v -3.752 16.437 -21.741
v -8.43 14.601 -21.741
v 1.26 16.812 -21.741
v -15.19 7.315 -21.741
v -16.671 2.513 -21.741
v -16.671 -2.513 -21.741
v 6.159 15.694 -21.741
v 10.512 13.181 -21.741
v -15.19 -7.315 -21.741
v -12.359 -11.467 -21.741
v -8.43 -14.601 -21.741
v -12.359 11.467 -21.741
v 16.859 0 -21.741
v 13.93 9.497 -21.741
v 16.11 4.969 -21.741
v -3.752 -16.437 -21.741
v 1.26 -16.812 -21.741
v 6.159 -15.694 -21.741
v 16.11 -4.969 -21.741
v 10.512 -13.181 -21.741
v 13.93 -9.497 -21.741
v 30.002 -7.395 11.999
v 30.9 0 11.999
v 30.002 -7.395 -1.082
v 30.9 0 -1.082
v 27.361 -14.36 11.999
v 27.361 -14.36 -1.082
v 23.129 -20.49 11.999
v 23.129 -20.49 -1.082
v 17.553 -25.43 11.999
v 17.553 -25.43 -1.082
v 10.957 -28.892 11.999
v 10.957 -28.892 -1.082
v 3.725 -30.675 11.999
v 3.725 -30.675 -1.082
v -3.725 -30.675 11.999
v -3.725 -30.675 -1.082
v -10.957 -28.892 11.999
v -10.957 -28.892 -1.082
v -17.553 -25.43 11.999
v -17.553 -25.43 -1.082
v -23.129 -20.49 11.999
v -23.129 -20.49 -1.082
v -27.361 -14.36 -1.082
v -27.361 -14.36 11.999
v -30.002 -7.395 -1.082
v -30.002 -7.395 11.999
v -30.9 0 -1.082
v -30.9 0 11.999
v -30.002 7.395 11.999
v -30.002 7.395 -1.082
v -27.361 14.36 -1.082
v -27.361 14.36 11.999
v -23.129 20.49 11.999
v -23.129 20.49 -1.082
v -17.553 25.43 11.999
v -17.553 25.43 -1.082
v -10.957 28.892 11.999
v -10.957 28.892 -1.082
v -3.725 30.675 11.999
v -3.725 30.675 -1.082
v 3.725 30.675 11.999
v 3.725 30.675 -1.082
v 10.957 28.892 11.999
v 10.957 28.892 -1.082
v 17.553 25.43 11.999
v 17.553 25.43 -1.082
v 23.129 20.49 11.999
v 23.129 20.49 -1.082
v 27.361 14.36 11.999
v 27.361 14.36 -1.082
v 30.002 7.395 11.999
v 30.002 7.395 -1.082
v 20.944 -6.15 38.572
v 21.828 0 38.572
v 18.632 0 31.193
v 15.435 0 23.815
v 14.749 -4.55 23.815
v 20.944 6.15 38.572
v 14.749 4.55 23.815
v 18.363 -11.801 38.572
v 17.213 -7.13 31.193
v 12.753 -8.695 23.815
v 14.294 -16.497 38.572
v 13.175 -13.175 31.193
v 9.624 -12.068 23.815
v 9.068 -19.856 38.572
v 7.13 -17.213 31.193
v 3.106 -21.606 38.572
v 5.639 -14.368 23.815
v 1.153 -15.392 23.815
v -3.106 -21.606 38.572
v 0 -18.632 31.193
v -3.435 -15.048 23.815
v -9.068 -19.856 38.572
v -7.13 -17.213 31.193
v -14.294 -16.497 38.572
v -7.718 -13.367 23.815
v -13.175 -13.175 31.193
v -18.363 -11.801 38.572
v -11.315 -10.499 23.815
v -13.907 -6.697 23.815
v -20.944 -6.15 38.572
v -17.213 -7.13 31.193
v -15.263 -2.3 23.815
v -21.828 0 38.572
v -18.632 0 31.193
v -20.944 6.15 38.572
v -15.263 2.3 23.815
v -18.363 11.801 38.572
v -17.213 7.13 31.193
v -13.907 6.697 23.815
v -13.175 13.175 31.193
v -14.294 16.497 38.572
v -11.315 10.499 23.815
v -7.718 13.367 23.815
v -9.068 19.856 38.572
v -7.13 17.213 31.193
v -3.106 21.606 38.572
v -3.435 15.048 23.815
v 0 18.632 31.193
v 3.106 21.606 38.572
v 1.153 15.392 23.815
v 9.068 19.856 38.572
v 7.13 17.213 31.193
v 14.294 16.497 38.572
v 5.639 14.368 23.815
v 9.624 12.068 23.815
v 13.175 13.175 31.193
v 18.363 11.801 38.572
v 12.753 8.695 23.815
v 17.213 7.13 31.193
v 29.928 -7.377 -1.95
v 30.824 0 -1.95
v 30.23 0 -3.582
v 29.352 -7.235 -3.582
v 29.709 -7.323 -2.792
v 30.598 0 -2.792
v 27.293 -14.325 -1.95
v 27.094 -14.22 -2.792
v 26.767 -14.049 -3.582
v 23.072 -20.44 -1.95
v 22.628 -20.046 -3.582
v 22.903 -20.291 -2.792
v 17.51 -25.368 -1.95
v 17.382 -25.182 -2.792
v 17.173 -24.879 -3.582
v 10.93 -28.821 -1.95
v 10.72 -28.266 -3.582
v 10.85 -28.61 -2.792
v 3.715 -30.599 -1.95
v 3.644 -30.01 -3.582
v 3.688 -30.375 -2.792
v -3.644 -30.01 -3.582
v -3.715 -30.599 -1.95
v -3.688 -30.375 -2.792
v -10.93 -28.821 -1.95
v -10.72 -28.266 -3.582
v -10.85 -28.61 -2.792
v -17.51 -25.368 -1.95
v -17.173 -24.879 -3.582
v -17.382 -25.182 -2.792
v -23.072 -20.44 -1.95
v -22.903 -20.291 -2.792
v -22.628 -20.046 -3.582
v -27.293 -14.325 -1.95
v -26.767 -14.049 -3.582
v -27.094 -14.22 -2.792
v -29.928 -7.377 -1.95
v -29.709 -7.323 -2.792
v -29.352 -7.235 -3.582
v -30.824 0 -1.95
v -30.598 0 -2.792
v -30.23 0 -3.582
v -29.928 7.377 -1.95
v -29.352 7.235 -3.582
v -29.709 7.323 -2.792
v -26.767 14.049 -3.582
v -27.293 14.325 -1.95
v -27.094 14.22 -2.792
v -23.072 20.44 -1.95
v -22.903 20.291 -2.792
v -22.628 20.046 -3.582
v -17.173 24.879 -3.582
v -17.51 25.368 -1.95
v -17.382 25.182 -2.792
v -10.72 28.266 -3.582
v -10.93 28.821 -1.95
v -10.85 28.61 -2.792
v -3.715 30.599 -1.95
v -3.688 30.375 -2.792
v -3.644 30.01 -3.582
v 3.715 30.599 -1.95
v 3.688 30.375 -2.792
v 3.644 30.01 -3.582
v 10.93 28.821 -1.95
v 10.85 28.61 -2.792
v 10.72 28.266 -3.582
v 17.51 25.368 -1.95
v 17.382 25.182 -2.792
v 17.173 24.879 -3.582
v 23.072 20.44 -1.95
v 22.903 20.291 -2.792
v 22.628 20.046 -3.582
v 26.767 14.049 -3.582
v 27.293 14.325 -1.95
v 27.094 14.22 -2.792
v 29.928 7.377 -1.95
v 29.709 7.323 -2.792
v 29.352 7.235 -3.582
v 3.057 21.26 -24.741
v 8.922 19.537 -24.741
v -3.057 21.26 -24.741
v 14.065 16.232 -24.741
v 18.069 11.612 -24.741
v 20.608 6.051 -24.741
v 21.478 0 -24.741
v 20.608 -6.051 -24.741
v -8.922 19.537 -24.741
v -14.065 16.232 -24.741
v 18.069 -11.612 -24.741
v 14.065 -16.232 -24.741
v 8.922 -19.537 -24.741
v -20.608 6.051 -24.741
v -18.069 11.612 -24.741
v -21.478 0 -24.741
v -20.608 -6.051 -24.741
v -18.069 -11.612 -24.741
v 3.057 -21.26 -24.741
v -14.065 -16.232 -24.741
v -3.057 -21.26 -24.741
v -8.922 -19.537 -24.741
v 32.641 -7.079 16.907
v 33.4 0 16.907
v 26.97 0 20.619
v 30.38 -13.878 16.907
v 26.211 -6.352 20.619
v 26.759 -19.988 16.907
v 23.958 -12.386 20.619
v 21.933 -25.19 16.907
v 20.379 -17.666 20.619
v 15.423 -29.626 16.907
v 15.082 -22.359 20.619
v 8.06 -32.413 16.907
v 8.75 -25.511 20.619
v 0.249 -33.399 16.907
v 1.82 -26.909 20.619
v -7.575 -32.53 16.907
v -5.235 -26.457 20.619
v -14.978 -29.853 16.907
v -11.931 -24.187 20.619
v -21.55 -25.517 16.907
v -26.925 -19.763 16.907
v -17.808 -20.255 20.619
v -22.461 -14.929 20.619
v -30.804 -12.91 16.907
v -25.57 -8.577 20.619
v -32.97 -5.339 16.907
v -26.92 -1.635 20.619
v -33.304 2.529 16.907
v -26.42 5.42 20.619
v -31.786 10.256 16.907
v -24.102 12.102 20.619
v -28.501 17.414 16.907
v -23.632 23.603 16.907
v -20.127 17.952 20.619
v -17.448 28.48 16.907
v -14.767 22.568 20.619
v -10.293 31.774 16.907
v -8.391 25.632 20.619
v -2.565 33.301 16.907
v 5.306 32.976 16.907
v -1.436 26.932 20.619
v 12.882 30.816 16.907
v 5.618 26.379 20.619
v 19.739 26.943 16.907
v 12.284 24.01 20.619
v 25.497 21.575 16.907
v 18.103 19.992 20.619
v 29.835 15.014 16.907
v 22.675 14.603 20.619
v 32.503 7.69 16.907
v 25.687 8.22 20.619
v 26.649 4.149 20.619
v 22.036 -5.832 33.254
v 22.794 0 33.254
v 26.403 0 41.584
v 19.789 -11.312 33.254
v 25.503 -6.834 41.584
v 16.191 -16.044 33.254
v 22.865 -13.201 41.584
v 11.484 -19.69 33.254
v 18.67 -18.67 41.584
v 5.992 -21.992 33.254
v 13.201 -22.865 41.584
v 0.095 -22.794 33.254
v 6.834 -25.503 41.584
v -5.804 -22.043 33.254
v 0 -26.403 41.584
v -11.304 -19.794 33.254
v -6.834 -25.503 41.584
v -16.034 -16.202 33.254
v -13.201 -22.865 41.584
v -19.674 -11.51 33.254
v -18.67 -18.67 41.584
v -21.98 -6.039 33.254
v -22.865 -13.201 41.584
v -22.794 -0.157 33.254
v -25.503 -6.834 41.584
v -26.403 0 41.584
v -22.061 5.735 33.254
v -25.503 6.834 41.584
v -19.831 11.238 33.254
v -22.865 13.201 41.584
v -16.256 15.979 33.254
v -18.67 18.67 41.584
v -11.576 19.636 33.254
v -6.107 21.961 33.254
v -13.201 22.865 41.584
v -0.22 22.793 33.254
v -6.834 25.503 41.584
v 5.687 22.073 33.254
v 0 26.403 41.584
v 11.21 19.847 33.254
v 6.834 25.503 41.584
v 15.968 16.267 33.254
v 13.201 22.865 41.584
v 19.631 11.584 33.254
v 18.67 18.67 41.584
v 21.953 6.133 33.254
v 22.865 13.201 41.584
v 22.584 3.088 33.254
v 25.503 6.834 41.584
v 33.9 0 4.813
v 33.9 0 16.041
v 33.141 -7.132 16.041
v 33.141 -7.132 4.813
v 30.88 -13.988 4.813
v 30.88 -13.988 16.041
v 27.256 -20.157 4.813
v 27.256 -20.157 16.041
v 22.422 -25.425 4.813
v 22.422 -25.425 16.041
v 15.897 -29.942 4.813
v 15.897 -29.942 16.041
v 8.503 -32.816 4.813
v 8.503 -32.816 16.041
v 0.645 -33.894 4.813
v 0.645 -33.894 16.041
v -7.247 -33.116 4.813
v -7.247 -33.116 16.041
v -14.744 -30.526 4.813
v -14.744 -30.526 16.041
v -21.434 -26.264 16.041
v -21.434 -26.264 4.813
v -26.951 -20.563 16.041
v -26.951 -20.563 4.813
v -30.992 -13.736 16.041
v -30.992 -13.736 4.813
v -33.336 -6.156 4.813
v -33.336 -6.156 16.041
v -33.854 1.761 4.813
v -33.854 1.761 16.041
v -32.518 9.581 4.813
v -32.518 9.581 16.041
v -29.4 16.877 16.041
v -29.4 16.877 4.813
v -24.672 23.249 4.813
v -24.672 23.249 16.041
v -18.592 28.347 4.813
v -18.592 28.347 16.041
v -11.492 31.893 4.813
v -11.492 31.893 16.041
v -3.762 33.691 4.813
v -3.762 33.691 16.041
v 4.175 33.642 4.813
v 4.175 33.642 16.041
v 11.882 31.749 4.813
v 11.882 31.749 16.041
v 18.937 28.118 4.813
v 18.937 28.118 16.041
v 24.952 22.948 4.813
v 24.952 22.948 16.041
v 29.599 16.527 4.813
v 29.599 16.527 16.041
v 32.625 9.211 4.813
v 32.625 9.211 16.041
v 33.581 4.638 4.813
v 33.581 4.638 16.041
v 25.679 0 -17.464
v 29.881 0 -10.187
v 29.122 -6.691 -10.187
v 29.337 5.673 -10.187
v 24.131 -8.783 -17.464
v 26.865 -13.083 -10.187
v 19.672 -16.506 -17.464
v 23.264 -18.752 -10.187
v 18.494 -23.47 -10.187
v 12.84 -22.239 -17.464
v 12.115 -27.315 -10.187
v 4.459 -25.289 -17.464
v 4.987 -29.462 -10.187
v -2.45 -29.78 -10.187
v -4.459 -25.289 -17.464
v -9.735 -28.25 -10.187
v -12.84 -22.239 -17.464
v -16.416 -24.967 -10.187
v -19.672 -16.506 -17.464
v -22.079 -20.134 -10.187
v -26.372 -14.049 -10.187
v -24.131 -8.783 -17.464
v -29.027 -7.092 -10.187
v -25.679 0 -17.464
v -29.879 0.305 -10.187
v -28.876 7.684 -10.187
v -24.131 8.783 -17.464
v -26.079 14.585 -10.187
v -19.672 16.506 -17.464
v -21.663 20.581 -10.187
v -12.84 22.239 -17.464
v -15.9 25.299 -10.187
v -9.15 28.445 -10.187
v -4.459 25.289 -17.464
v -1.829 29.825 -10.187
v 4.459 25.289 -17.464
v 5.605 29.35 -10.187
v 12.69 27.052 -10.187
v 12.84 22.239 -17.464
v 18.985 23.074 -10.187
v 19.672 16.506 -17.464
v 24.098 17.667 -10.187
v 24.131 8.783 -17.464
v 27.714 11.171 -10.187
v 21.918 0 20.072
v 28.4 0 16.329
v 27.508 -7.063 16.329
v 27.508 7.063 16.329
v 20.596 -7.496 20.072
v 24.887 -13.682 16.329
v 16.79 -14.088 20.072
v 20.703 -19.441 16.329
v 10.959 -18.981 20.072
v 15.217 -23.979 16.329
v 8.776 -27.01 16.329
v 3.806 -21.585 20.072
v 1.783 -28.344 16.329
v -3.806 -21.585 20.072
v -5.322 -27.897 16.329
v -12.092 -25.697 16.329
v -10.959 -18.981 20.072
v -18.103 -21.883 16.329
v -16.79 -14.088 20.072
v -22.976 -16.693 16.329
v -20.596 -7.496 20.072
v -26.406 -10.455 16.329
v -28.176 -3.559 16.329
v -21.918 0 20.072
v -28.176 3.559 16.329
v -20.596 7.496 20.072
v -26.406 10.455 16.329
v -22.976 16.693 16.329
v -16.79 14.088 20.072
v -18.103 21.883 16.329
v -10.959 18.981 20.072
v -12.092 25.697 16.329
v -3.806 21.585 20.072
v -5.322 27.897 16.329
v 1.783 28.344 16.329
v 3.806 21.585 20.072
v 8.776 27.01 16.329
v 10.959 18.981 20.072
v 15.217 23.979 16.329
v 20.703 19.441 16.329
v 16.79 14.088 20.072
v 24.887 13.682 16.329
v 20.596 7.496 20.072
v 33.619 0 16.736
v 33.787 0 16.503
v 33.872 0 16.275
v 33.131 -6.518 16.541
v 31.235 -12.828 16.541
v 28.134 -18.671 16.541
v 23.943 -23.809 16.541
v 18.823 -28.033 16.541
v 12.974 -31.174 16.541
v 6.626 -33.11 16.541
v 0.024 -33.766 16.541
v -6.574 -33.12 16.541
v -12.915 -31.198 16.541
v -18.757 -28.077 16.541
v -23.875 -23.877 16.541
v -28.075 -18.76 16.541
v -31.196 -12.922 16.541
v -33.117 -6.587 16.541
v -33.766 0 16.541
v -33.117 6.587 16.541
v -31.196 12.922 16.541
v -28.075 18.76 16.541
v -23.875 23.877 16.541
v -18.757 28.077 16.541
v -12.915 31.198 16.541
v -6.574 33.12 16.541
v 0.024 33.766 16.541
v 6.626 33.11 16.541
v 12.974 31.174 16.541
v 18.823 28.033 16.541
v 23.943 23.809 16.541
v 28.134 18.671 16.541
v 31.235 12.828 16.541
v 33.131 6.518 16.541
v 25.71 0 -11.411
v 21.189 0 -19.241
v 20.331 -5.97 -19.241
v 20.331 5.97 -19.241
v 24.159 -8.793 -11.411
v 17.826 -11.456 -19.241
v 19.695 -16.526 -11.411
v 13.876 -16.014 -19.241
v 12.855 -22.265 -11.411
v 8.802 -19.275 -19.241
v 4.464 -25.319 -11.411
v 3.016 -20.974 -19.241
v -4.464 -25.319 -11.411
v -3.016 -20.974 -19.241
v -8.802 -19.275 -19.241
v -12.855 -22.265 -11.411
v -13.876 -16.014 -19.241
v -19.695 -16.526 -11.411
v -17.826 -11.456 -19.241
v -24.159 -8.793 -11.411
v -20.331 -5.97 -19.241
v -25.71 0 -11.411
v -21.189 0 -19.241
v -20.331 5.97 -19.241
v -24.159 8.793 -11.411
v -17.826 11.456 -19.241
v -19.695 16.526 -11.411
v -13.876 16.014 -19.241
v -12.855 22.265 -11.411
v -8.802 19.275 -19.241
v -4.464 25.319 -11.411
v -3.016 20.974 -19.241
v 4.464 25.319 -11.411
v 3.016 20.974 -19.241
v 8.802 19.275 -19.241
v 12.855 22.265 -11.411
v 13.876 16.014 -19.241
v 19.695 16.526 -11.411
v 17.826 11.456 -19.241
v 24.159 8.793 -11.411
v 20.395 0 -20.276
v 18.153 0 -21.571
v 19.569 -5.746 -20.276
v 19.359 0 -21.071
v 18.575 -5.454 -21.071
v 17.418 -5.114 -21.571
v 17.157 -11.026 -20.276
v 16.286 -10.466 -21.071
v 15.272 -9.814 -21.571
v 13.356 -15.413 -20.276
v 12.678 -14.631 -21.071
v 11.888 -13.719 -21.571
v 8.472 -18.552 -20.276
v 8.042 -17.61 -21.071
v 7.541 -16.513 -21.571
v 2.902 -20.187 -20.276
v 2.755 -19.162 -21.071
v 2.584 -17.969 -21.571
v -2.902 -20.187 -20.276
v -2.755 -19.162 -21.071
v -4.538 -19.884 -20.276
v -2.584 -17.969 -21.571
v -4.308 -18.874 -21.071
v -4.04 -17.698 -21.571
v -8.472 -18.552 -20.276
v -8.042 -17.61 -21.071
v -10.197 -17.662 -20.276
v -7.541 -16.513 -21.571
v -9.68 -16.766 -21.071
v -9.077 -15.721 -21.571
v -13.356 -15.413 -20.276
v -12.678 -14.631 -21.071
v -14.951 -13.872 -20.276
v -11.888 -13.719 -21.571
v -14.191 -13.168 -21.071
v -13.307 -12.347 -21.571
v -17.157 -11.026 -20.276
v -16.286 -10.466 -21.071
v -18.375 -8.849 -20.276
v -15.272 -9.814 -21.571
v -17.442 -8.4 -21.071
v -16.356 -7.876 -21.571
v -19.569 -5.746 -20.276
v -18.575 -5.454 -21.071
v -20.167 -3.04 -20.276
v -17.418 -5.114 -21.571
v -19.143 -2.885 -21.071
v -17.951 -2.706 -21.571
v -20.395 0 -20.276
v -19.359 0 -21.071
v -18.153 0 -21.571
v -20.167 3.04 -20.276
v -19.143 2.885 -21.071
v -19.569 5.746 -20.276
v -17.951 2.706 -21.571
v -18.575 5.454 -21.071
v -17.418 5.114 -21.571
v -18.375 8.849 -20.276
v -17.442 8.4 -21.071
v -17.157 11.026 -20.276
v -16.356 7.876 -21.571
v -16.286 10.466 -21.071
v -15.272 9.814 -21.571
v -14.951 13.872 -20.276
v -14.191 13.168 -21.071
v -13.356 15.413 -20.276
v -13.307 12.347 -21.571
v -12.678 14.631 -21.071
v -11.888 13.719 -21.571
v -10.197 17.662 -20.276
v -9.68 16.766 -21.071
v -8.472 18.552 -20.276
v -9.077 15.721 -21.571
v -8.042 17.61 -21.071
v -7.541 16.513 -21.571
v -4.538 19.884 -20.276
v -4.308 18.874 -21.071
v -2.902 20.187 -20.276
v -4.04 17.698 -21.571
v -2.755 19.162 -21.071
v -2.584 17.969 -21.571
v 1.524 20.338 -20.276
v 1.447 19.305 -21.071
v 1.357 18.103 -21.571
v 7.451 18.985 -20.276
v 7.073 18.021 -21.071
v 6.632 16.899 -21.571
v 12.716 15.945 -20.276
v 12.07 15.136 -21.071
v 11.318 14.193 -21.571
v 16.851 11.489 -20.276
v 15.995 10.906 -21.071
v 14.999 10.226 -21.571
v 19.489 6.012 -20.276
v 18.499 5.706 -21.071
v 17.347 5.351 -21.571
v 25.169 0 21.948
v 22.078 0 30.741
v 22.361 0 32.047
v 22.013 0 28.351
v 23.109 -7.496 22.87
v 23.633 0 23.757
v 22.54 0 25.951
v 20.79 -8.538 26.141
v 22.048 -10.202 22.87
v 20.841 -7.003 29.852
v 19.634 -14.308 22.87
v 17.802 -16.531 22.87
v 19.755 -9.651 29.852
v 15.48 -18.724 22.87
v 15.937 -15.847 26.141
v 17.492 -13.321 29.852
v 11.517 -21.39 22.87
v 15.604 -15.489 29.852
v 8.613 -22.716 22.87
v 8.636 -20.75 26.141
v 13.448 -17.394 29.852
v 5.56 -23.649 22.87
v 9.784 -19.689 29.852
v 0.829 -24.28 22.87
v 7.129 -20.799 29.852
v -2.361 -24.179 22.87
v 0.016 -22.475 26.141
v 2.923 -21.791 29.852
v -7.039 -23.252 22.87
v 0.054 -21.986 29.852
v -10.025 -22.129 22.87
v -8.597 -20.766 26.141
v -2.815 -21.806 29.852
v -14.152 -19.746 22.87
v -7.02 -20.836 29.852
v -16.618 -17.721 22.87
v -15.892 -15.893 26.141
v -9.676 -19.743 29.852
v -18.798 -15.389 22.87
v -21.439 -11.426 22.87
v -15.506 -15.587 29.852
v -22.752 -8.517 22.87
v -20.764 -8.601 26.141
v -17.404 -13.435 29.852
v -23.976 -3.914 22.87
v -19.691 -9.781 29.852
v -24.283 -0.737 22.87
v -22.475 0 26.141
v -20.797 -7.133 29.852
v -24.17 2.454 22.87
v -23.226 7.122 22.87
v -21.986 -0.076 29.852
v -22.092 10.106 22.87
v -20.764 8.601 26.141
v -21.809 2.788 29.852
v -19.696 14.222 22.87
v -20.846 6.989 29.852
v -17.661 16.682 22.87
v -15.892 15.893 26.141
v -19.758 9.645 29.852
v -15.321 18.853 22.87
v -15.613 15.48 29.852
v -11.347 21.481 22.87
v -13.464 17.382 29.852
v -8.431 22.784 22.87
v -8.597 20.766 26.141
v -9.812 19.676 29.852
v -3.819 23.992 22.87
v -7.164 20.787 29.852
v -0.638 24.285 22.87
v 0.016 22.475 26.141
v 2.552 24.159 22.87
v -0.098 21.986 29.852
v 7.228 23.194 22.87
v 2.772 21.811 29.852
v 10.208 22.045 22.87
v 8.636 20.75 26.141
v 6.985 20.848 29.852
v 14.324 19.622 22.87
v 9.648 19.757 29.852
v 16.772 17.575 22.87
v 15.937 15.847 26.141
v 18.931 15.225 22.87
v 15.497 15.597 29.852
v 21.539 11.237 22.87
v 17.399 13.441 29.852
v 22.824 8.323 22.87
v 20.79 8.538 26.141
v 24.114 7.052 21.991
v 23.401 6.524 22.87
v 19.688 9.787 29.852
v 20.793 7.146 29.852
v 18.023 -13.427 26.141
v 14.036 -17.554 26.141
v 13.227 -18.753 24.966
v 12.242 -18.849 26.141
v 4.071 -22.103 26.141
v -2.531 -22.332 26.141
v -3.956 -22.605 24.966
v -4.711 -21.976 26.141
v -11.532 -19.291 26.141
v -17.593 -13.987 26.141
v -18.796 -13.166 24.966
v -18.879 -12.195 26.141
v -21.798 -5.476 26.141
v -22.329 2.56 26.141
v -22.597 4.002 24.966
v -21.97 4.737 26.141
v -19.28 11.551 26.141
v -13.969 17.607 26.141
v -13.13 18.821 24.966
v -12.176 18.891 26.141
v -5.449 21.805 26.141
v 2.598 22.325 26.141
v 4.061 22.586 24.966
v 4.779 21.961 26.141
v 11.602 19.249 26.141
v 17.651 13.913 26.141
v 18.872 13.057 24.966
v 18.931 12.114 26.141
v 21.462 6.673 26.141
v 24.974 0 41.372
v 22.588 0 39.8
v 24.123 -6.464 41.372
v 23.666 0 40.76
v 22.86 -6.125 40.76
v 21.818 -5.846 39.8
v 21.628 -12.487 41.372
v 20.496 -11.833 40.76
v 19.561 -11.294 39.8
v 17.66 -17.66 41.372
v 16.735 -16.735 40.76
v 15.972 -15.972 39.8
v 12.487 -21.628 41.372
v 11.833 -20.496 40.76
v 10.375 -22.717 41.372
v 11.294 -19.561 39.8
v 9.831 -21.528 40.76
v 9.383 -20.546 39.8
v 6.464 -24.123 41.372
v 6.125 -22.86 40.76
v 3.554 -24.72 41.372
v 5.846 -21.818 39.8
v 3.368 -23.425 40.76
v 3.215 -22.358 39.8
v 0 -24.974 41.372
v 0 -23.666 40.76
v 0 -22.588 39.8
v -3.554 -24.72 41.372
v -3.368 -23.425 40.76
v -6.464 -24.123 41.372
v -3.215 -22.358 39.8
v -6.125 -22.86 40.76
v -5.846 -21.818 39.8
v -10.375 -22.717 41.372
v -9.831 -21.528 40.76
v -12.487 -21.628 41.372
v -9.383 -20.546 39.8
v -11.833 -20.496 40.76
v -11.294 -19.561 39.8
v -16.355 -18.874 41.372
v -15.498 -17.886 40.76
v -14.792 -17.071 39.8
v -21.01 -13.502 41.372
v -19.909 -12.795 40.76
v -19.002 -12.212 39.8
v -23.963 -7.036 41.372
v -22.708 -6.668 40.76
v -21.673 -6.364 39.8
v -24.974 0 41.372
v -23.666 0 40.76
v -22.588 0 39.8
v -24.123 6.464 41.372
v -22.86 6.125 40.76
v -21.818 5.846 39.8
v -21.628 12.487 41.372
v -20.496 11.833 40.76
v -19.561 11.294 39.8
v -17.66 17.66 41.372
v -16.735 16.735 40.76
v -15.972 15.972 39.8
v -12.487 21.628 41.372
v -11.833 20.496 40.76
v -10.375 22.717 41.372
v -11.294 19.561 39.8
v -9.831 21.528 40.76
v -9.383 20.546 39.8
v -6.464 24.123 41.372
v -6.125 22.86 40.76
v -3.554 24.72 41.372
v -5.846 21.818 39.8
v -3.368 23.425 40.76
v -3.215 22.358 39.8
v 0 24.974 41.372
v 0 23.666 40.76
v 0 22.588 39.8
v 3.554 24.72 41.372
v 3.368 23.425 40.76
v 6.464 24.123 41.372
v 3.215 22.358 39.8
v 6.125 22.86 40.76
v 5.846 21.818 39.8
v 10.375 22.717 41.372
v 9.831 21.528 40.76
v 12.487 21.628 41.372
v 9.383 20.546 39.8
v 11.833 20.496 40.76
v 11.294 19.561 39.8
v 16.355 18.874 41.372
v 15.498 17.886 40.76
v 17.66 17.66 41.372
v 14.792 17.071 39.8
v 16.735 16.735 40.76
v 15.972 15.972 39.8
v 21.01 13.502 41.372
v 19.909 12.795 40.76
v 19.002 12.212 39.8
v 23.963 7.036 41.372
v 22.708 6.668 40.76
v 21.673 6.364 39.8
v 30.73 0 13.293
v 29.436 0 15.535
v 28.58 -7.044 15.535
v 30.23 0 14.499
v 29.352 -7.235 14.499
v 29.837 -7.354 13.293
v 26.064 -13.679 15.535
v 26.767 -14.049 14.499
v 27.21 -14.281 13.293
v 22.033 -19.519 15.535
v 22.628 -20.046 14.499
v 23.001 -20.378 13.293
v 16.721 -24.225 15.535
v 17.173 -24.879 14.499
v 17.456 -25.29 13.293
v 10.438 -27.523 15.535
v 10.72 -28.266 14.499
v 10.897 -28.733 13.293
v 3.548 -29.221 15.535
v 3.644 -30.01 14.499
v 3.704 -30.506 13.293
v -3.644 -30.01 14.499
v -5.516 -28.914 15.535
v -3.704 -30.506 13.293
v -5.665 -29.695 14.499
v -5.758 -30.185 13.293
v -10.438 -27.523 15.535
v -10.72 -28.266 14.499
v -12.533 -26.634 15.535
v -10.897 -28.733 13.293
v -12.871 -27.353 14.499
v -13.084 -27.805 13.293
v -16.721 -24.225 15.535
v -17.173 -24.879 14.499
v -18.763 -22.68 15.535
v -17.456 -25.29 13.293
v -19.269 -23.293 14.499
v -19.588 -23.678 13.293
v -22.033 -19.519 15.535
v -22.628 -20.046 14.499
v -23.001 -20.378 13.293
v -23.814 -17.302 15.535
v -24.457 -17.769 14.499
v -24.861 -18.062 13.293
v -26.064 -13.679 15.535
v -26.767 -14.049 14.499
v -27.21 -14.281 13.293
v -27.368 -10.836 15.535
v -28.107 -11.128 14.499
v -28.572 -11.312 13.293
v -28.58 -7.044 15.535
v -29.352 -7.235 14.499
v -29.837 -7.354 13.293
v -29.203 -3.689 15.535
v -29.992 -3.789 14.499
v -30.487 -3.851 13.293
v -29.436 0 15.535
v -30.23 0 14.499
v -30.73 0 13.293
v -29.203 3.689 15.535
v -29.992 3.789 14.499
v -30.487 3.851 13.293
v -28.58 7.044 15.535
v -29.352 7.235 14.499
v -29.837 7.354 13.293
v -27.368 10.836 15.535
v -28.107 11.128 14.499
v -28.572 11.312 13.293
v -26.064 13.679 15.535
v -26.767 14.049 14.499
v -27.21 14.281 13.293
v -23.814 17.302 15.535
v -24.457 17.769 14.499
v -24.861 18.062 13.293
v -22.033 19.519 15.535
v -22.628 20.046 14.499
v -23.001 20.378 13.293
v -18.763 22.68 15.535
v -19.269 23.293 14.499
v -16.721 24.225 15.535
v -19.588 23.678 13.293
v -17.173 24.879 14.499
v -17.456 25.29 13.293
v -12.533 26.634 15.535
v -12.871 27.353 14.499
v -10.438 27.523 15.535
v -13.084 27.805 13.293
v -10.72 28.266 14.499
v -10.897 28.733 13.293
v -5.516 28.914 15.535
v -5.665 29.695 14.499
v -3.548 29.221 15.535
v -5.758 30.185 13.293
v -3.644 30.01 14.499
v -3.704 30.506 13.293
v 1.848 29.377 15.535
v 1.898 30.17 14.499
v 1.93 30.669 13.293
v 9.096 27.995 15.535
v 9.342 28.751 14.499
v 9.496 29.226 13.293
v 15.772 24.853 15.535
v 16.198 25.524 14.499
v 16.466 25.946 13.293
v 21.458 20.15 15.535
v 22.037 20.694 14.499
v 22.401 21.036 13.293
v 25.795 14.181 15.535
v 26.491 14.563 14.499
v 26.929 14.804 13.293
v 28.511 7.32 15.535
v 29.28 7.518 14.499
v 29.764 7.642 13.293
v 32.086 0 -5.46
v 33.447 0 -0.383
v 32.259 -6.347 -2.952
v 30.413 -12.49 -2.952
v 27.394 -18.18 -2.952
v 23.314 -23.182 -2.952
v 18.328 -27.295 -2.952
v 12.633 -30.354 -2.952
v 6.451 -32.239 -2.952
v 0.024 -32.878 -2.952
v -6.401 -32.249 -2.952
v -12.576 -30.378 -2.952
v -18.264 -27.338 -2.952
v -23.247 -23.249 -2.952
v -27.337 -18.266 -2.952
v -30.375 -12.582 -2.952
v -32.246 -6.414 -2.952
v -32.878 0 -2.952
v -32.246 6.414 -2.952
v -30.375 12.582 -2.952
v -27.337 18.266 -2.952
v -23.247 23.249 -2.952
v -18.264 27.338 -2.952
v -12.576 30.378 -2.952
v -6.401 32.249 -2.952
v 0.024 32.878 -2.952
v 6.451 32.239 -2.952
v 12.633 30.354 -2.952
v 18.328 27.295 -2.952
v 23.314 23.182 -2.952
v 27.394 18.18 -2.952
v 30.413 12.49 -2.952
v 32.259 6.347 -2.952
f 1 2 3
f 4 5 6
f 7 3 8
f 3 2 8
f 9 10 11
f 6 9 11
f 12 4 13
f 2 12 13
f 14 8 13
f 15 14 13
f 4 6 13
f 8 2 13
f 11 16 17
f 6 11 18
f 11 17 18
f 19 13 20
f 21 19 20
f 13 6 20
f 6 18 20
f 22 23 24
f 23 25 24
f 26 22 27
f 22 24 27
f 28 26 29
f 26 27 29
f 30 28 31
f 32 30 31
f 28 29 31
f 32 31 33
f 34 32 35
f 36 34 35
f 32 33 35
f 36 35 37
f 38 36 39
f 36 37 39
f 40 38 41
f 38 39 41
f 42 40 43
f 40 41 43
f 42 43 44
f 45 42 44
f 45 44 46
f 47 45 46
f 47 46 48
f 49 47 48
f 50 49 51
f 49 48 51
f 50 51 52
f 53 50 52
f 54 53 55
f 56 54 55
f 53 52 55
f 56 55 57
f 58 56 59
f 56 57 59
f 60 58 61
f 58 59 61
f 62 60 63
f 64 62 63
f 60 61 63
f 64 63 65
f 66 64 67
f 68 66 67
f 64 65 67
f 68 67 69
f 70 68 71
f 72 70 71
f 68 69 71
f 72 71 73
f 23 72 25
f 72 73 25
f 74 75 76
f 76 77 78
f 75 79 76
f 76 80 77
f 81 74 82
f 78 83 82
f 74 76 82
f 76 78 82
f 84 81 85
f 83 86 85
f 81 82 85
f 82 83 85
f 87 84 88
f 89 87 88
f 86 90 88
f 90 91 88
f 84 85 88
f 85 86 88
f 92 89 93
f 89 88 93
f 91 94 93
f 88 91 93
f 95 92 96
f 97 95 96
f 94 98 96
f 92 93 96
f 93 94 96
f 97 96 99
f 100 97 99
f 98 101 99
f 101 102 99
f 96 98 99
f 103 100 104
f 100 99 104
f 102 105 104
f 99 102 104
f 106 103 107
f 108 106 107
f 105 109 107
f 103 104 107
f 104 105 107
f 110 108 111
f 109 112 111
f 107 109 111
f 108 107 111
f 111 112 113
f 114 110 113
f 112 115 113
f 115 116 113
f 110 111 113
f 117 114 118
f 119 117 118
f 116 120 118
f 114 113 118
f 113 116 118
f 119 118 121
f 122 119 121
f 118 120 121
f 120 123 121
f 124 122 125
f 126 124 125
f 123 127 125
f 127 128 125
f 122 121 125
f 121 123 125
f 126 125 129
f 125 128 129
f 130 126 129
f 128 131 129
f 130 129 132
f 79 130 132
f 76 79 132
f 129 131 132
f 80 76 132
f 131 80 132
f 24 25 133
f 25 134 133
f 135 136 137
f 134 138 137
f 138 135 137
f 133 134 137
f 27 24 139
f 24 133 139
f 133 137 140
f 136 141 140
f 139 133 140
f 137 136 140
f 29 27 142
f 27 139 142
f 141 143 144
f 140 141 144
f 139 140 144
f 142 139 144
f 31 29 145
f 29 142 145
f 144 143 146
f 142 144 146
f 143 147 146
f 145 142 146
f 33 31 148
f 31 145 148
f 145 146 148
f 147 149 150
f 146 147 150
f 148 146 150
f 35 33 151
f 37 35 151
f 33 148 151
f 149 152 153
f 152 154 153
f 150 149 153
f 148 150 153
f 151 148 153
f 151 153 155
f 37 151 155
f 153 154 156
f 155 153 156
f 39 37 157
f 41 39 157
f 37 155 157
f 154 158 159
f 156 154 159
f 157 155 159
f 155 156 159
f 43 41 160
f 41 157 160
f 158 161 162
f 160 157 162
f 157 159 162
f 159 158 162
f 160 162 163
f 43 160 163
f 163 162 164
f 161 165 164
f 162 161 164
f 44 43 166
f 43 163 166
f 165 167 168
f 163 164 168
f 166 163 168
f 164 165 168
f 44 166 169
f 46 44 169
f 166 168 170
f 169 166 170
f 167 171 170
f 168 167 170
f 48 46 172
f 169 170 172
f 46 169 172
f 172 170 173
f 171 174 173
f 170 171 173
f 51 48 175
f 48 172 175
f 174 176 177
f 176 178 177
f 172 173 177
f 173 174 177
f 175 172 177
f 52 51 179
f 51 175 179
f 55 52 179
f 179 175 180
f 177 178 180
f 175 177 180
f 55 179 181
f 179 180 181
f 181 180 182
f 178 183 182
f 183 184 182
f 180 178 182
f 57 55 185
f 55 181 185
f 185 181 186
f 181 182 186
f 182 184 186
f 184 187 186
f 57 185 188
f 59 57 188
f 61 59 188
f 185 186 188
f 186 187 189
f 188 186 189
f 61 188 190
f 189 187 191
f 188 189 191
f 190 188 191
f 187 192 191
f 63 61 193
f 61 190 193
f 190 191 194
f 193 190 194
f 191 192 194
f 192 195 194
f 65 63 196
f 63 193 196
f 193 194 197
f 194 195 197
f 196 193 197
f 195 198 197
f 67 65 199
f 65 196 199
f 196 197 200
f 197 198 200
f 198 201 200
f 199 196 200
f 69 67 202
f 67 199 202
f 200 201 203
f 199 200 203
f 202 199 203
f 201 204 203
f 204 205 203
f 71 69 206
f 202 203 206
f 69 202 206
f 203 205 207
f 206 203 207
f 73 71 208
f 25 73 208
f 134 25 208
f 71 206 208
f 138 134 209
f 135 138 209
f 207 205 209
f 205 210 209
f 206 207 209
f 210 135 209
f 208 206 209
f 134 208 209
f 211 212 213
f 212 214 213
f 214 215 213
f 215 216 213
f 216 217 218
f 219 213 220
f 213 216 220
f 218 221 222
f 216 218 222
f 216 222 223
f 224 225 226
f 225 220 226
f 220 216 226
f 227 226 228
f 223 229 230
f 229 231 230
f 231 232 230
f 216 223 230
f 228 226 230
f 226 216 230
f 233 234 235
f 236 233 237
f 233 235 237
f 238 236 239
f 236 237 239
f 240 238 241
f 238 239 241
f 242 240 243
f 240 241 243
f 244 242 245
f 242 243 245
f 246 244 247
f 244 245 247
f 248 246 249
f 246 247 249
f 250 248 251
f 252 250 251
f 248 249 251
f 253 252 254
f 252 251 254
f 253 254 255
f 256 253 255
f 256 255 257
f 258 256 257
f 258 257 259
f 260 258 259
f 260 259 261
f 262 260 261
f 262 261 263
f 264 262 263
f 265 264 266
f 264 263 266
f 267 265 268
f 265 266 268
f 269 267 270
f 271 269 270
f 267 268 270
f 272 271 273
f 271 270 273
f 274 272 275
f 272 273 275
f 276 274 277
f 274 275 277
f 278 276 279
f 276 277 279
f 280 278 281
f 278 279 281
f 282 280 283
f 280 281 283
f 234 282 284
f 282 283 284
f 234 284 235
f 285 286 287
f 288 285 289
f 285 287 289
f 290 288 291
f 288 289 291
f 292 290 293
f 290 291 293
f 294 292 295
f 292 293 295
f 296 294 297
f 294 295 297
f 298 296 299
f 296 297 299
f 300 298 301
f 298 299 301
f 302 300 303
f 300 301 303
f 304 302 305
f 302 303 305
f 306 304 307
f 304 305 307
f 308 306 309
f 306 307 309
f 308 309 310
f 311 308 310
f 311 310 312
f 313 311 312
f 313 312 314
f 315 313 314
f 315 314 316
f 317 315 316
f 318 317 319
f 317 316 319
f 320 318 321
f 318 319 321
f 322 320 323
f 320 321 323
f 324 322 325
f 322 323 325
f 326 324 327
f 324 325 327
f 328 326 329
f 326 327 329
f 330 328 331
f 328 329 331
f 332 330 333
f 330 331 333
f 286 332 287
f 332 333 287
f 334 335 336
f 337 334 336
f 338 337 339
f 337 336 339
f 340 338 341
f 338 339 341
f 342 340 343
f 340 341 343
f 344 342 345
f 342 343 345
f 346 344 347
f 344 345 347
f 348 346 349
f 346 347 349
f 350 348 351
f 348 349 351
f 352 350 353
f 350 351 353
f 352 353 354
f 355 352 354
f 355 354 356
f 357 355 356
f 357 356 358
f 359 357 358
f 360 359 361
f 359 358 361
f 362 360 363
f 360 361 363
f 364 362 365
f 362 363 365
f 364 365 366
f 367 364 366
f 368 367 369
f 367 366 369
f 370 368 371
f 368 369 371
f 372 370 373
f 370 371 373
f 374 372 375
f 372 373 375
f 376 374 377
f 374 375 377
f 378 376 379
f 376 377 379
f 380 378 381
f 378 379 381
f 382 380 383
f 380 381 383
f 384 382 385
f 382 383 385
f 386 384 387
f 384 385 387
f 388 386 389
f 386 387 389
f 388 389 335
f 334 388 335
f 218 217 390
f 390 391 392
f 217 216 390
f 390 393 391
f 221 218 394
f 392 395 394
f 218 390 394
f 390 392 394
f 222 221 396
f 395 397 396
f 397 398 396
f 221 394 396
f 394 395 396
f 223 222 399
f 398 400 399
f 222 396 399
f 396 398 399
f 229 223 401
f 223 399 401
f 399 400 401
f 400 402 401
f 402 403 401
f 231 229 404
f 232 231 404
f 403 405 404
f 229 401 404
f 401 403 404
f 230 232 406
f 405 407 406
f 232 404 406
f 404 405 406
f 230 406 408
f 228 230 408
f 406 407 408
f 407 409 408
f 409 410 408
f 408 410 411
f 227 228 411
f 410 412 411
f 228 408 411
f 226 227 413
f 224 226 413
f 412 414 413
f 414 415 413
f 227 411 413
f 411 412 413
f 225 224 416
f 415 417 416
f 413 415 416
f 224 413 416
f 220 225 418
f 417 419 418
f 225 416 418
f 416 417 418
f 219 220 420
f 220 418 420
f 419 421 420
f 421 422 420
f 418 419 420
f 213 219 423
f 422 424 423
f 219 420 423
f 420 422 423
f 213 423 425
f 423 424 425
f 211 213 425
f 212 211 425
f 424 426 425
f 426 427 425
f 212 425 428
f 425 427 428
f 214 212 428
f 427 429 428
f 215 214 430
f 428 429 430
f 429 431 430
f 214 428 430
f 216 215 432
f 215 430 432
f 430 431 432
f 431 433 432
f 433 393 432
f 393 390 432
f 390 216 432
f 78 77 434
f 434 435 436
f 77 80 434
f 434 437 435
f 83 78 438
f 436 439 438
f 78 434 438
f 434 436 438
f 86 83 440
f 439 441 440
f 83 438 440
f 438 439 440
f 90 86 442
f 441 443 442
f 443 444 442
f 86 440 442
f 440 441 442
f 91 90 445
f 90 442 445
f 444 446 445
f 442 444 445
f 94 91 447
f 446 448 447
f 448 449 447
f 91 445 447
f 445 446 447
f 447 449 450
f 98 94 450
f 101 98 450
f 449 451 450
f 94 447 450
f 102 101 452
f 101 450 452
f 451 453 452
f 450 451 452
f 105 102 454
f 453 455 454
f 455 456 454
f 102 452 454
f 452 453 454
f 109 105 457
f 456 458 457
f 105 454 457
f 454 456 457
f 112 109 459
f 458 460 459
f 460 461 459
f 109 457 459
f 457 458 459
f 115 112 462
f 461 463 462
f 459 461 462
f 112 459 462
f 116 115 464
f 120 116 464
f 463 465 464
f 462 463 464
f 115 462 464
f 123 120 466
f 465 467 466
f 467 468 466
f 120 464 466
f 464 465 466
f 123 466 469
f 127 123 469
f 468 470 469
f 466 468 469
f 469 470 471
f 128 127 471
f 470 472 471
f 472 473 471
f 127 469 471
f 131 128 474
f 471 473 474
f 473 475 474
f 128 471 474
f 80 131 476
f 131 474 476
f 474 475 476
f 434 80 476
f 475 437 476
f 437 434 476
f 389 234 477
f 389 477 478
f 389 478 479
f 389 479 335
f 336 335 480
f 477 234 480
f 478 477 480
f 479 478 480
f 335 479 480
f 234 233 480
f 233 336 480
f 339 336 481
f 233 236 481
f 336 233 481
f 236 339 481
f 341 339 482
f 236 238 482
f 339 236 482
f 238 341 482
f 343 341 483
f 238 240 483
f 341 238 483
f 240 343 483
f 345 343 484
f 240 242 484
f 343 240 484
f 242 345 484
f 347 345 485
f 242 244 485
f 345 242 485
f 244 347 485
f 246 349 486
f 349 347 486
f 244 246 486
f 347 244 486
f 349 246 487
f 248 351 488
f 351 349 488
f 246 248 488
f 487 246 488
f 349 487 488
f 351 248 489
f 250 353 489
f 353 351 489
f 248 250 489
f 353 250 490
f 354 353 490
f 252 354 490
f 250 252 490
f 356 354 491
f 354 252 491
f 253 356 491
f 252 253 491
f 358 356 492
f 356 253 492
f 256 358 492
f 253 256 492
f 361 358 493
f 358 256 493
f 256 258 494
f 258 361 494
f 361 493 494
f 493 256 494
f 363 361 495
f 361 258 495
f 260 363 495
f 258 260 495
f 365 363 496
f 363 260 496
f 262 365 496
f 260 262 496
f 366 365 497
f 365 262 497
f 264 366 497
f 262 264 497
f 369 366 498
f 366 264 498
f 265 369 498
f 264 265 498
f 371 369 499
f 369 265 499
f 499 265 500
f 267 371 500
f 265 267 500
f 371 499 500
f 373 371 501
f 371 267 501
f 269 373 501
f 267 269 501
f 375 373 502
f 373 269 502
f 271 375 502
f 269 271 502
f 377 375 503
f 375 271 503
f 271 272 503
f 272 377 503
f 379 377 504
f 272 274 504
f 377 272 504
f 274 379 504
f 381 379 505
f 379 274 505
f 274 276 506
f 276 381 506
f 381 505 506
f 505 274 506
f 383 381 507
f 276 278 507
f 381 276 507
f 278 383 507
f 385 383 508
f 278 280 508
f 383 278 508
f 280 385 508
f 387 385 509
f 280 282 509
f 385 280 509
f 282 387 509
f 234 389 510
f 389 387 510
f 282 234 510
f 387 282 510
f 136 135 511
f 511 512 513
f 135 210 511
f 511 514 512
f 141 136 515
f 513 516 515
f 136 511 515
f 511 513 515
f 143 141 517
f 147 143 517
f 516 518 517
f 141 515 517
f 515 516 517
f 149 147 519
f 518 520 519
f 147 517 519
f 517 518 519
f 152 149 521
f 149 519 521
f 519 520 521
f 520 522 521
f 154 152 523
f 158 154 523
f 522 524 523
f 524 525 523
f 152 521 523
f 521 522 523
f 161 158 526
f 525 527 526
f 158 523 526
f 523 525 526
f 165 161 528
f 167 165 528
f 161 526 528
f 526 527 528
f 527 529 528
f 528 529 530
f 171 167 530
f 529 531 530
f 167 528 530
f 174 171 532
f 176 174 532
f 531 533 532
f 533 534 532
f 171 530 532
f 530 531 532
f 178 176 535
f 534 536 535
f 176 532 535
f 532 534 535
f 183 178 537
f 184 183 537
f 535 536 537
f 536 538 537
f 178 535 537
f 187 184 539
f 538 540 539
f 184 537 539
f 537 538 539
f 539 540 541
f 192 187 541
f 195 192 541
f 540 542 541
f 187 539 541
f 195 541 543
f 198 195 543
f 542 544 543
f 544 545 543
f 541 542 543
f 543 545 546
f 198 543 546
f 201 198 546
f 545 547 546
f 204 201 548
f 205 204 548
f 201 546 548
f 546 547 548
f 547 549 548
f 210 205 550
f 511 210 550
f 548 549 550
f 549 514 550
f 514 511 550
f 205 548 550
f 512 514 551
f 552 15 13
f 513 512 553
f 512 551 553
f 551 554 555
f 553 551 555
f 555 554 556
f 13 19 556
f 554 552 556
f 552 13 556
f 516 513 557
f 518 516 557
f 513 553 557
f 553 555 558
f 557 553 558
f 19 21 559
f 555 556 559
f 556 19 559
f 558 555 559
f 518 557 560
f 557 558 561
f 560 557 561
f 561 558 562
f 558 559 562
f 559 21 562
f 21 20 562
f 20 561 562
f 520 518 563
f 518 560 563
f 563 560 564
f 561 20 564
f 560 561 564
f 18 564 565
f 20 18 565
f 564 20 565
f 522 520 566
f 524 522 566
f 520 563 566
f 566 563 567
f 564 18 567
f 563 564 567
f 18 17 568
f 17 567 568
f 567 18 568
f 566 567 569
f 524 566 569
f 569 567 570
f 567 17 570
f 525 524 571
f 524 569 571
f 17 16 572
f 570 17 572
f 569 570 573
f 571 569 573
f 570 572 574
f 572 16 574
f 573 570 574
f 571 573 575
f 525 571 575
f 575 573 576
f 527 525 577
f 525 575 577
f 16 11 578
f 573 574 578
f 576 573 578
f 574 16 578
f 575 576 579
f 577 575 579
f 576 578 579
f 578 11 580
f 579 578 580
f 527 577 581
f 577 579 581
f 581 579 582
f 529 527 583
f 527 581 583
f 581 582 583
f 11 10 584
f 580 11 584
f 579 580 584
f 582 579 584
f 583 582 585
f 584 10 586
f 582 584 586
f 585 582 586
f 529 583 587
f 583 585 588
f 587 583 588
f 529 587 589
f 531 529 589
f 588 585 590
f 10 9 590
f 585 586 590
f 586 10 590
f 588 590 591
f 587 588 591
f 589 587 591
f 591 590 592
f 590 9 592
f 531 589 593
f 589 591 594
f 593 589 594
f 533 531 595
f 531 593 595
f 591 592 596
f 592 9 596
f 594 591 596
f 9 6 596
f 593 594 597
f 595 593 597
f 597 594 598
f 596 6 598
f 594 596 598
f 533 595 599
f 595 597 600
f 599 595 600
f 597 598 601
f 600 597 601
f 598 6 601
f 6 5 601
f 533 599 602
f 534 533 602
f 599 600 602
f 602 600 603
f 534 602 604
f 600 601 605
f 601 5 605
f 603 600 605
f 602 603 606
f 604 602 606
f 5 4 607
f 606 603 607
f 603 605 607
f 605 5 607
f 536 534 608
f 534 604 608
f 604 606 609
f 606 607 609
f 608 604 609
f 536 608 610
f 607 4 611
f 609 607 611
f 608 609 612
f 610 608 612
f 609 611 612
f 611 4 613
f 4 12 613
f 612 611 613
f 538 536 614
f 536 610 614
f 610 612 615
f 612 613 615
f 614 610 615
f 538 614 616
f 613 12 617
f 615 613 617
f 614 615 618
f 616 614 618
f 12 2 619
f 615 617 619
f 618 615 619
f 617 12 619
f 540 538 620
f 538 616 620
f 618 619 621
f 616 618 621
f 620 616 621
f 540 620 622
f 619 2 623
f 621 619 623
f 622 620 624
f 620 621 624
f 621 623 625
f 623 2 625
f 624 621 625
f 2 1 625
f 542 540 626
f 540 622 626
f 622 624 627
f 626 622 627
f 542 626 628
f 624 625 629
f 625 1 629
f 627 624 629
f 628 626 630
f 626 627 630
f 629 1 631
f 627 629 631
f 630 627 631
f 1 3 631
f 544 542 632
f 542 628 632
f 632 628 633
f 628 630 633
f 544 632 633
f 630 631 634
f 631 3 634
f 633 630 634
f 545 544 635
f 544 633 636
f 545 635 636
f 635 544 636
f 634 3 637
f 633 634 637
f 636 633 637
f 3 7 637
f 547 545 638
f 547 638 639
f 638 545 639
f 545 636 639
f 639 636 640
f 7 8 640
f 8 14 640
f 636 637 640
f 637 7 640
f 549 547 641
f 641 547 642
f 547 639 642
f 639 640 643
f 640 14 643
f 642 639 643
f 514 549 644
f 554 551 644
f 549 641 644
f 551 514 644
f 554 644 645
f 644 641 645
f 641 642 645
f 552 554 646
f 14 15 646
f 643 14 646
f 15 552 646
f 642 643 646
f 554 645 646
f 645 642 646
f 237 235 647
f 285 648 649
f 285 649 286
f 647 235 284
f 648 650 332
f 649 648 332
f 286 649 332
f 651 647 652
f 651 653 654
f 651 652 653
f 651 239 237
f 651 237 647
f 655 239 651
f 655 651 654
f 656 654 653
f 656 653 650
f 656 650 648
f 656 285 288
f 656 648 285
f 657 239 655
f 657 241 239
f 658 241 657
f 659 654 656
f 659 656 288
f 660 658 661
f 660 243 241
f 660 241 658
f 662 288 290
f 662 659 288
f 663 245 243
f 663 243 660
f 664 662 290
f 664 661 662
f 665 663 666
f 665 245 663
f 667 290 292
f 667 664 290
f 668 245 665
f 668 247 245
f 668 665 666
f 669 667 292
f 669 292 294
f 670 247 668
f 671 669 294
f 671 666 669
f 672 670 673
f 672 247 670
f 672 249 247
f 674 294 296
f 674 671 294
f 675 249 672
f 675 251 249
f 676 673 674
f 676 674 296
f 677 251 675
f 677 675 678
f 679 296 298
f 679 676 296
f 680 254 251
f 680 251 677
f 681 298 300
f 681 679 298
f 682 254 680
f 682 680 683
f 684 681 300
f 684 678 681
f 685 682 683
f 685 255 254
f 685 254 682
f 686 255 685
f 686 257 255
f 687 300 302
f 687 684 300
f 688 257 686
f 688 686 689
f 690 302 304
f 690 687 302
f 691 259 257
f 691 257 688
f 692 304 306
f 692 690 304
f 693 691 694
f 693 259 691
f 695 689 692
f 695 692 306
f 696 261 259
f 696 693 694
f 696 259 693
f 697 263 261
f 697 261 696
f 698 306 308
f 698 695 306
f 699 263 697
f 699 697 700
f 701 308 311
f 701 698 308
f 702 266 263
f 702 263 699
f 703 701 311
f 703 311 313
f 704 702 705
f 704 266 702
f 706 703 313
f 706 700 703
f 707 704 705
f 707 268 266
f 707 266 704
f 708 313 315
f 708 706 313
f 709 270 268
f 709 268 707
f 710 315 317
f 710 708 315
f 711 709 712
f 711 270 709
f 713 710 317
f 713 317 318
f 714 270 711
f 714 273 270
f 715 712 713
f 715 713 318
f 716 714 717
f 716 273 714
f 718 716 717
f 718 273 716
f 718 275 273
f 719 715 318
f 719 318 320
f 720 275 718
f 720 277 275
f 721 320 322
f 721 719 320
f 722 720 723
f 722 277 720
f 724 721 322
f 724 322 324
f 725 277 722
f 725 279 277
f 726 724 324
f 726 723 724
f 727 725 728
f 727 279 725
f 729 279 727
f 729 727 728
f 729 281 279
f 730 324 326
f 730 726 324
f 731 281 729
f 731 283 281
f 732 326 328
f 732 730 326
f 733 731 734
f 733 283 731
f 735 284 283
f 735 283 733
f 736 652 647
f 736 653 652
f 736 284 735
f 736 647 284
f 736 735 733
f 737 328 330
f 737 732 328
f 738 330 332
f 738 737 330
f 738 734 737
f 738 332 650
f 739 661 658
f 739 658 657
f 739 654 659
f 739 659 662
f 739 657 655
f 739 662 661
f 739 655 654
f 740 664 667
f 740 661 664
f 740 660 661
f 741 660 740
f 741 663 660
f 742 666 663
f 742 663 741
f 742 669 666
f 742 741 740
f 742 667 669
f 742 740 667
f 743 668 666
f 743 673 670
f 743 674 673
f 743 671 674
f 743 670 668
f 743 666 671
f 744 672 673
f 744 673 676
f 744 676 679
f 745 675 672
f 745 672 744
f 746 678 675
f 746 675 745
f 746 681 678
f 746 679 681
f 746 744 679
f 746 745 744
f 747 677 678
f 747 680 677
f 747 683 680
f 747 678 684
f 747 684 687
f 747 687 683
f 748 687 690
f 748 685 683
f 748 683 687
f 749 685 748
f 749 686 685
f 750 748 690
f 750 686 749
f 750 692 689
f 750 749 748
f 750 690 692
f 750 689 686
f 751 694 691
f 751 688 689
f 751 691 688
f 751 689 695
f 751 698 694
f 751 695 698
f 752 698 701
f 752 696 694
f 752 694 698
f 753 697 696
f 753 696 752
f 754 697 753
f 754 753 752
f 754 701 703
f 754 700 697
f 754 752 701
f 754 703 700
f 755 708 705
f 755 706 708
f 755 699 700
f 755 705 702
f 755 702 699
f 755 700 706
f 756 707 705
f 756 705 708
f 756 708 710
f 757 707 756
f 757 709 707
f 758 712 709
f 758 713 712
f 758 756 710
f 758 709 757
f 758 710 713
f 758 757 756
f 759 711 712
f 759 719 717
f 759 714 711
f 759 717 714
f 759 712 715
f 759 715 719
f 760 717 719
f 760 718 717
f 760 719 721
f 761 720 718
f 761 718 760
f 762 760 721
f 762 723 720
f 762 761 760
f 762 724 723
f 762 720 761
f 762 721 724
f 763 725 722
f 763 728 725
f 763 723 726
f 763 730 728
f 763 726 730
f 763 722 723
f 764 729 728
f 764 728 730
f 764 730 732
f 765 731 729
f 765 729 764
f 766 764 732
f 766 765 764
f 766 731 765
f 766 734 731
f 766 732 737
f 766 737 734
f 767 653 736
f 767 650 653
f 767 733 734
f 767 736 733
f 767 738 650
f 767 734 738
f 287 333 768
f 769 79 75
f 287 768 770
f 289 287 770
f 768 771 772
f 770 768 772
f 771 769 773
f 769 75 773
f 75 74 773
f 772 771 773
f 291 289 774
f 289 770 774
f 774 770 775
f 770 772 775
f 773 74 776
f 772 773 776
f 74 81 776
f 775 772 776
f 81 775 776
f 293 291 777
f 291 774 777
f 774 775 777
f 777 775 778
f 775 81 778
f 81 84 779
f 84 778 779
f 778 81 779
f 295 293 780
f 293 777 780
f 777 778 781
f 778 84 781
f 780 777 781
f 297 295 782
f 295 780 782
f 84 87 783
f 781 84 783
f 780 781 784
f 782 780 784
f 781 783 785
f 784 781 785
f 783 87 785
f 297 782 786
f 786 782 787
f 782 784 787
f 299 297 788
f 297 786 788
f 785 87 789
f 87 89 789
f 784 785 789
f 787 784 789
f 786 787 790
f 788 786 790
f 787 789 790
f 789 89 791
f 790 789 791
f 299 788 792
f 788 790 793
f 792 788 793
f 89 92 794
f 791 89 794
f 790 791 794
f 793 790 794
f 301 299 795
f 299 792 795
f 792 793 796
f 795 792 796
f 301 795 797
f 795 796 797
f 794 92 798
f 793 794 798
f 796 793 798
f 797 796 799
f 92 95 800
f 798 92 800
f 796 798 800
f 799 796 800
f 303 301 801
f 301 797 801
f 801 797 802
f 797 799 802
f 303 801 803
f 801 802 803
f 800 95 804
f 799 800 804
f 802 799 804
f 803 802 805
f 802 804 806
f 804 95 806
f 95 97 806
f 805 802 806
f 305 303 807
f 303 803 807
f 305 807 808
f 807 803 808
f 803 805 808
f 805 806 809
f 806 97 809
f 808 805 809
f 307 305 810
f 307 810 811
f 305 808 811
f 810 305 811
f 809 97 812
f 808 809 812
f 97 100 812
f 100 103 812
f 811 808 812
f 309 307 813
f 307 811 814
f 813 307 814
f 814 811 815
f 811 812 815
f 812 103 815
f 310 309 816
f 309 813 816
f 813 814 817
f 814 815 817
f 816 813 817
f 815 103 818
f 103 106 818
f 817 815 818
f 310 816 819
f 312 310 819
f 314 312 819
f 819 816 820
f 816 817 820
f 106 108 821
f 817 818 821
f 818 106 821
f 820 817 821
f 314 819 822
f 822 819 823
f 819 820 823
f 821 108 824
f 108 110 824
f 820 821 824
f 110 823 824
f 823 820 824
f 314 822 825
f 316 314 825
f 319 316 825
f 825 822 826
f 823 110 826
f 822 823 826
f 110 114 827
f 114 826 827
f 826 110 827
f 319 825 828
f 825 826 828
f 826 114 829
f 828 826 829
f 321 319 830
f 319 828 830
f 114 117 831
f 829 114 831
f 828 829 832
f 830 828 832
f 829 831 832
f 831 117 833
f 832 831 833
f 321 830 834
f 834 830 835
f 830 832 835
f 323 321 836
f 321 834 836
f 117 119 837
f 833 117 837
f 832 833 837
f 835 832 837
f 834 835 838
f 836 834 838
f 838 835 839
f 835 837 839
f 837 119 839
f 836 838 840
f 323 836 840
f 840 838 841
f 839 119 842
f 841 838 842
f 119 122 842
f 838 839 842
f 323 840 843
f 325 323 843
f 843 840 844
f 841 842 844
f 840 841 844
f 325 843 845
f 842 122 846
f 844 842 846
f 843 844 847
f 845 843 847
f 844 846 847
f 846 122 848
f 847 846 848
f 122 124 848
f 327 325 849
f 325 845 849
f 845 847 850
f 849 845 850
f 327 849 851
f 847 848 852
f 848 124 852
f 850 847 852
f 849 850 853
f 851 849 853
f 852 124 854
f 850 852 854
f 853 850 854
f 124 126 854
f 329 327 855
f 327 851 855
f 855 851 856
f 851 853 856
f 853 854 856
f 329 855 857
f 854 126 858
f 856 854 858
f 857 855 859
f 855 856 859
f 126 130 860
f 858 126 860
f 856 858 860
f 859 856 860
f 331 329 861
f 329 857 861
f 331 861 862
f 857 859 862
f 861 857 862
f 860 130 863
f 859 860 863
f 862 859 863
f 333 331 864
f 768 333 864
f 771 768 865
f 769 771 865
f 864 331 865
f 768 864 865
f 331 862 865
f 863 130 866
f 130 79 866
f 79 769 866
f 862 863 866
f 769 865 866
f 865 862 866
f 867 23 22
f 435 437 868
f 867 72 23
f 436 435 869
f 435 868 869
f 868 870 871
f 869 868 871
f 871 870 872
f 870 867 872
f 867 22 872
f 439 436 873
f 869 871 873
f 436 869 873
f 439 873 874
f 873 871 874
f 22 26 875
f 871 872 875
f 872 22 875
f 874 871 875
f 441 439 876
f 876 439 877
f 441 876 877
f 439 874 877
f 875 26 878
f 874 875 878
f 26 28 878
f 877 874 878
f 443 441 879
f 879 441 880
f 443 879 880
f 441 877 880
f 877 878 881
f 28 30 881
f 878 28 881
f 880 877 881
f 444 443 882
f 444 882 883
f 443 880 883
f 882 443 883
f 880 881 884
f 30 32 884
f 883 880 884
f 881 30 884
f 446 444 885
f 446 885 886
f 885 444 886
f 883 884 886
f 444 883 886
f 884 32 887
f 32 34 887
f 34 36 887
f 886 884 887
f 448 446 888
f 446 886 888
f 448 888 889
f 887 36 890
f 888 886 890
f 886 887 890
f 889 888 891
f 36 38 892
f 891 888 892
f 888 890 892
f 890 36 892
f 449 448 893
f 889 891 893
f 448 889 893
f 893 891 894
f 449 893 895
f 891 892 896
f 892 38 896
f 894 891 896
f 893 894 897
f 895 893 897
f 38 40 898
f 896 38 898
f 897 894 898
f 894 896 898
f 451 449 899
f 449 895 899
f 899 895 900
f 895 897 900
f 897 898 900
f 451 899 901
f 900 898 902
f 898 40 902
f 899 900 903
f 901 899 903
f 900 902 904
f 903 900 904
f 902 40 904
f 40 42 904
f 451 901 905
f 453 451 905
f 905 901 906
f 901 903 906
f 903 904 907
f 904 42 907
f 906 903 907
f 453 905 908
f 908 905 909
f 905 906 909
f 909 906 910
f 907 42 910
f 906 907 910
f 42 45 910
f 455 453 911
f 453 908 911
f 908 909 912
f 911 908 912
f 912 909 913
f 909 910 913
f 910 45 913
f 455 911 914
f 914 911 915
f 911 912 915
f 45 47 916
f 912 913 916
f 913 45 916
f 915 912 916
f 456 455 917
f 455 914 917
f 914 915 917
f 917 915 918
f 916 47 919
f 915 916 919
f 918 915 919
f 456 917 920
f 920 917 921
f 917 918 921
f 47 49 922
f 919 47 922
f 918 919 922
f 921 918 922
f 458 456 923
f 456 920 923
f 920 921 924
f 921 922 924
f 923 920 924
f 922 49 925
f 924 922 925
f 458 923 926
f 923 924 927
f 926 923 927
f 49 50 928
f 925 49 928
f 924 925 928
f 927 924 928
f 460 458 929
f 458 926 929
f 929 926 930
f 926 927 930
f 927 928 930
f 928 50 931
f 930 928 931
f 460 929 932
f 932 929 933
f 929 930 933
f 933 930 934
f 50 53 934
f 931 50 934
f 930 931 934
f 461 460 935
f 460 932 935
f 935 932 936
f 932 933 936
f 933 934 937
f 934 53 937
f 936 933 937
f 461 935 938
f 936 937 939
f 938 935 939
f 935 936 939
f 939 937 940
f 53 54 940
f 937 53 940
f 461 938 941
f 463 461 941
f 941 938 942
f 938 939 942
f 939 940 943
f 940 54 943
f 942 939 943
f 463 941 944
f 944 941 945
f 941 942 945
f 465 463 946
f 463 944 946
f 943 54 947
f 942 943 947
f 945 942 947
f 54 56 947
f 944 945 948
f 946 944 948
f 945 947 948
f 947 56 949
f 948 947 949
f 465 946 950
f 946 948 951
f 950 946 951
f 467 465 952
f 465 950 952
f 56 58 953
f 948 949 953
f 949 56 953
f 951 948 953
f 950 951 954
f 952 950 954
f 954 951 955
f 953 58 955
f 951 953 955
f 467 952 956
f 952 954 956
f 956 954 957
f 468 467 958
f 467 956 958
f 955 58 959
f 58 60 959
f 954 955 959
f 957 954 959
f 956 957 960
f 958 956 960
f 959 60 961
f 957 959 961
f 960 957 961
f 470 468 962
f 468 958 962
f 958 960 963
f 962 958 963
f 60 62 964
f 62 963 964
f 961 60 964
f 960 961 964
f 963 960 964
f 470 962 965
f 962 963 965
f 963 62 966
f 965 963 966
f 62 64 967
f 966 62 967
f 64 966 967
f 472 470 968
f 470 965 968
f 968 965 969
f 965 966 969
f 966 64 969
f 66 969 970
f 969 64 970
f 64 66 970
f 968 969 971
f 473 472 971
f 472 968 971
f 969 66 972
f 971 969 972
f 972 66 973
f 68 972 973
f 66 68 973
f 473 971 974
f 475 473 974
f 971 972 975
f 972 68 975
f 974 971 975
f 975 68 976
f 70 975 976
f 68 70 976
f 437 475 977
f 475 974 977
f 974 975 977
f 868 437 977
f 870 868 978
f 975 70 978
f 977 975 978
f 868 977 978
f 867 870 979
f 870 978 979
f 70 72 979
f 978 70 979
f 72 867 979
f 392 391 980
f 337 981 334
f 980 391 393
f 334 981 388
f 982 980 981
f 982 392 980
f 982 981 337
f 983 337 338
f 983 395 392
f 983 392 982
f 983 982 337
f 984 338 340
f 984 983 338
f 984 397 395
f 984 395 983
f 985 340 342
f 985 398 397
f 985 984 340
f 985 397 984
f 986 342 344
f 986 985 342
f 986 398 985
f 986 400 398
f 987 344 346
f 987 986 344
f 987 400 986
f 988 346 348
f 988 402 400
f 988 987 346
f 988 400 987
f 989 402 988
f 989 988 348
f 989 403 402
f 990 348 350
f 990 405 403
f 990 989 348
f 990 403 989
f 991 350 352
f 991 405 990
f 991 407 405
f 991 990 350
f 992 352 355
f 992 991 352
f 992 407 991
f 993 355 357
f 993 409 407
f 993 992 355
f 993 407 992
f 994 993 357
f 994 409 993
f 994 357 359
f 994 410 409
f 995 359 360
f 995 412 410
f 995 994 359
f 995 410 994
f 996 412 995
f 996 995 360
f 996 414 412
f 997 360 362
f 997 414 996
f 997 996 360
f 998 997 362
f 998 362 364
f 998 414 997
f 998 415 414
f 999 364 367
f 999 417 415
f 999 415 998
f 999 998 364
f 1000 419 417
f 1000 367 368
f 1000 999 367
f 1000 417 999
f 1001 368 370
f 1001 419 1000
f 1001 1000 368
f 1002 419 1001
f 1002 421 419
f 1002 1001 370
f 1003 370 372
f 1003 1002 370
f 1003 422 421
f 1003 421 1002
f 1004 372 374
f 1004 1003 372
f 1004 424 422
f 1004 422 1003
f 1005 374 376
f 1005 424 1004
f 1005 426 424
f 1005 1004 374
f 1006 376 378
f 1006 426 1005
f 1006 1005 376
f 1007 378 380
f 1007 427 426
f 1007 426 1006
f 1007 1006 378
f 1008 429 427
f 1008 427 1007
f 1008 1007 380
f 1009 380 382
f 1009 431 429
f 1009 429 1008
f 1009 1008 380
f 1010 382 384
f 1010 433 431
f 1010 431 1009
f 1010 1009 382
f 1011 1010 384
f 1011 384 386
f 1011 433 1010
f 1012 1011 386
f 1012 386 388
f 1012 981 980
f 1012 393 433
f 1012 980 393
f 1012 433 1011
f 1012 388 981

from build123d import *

# Parameters (mm, degrees)
F2_R = 30
F3_R = 10
F4_R = 1


# Not quite as in the source:
# - a fillet or chamfer that OpenCascade refuses, or shapes differently, is made with other operations: its cross-section is extruded or revolved along the edge and cut away or added


with BuildPart() as f1:
    # F0 (on Front) → F1 (revolve)
    with BuildSketch(Plane.XZ):
        with BuildLine():
            Line((0, -21.7408868024), (0, -24.7408868024))
            Line((0, -24.7408868024), (21.4781631635, -24.7408868024))
            Line((21.4781631635, -24.7408868024), (33.8999996632, -3.2256348616))
            Line((33.8999996632, -3.2256348616), (33.8999996632, 16.6180381379))
            Line((33.8999996632, 16.6180381379), (19.2509286784, 25.0756832143))
            Line((19.2509286784, 25.0756832143), (26.4026819505, 41.5839911591))
            Line((26.4026819505, 41.5839911591), (23.6499027339, 42.7765541907))
            Line((23.6499027339, 42.7765541907), (15.4351795785, 23.8146053692))
            Line((15.4351795785, 23.8146053692), (28.3999996632, 16.3293630033))
            ThreePointArc((28.3999996632, 16.3293630033), (30.2301266822, 14.4992359844), (30.8999996632, 11.9992359844))
            Line((30.8999996632, 11.9992359844), (30.8999996632, -1.0820413221))
            ThreePointArc((30.8999996632, -1.0820413221), (30.7296287947, -2.3761365476), (30.2301266822, -3.5820413221))
            Line((30.2301266822, -3.5820413221), (21.1894880289, -19.2408868024))
            ThreePointArc((21.1894880289, -19.2408868024), (19.35936101, -21.0710138213), (16.85936101, -21.7408868024))
            Line((16.85936101, -21.7408868024), (0, -21.7408868024))
        make_face()
    revolve(axis=Axis((0, 0, 6.5311510116), (0, 0, -1)))

    # F2
    f2_edges = [f1.edges().sort_by_distance(p)[0] for p in [
        (-33.9, 0, -3.225635),
    ]]
    fillet(f2_edges, radius=F2_R)

    # F3
    f3_edges = [f1.edges().sort_by_distance(p)[0] for p in [
        (-19.250929, 0, 25.075683),
    ]]
    fillet(f3_edges, radius=F3_R)

    # F4
    f4_edges = [f1.edges().sort_by_distance(p)[0] for p in [
        (-33.9, 0, 16.618038),
    ]]
    fillet(f4_edges, radius=F4_R)

    # F5: fillet of radius 5 on 1 edges, made by hand

    # F5_s1 → F5_t2 (revolve, cut)
    with BuildSketch(Plane.XZ):
        with BuildLine():
            ThreePointArc((26.4026819505, 41.5839911591), (23.6662868758, 40.7598912449), (21.8282326127, 38.5716144801))
            Line((21.8282326127, 38.5716144801), (21.7364733055, 38.6113665812))
            Line((21.7364733055, 38.6113665812), (23.5581434266, 42.8163062918))
            Line((23.5581434266, 42.8163062918), (23.6896548349, 42.8683134979))
            ThreePointArc((23.6896548349, 42.8683134979), (25.0660444432, 42.2720319821), (26.40241163, 41.6839907937))
            Line((26.40241163, 41.6839907937), (26.4026819505, 41.5839911591))
        make_face()
    revolve(axis=Axis((0, 0, 42.7765541907), (0, 0, -1)), mode=Mode.SUBTRACT)


solid = f1.part
